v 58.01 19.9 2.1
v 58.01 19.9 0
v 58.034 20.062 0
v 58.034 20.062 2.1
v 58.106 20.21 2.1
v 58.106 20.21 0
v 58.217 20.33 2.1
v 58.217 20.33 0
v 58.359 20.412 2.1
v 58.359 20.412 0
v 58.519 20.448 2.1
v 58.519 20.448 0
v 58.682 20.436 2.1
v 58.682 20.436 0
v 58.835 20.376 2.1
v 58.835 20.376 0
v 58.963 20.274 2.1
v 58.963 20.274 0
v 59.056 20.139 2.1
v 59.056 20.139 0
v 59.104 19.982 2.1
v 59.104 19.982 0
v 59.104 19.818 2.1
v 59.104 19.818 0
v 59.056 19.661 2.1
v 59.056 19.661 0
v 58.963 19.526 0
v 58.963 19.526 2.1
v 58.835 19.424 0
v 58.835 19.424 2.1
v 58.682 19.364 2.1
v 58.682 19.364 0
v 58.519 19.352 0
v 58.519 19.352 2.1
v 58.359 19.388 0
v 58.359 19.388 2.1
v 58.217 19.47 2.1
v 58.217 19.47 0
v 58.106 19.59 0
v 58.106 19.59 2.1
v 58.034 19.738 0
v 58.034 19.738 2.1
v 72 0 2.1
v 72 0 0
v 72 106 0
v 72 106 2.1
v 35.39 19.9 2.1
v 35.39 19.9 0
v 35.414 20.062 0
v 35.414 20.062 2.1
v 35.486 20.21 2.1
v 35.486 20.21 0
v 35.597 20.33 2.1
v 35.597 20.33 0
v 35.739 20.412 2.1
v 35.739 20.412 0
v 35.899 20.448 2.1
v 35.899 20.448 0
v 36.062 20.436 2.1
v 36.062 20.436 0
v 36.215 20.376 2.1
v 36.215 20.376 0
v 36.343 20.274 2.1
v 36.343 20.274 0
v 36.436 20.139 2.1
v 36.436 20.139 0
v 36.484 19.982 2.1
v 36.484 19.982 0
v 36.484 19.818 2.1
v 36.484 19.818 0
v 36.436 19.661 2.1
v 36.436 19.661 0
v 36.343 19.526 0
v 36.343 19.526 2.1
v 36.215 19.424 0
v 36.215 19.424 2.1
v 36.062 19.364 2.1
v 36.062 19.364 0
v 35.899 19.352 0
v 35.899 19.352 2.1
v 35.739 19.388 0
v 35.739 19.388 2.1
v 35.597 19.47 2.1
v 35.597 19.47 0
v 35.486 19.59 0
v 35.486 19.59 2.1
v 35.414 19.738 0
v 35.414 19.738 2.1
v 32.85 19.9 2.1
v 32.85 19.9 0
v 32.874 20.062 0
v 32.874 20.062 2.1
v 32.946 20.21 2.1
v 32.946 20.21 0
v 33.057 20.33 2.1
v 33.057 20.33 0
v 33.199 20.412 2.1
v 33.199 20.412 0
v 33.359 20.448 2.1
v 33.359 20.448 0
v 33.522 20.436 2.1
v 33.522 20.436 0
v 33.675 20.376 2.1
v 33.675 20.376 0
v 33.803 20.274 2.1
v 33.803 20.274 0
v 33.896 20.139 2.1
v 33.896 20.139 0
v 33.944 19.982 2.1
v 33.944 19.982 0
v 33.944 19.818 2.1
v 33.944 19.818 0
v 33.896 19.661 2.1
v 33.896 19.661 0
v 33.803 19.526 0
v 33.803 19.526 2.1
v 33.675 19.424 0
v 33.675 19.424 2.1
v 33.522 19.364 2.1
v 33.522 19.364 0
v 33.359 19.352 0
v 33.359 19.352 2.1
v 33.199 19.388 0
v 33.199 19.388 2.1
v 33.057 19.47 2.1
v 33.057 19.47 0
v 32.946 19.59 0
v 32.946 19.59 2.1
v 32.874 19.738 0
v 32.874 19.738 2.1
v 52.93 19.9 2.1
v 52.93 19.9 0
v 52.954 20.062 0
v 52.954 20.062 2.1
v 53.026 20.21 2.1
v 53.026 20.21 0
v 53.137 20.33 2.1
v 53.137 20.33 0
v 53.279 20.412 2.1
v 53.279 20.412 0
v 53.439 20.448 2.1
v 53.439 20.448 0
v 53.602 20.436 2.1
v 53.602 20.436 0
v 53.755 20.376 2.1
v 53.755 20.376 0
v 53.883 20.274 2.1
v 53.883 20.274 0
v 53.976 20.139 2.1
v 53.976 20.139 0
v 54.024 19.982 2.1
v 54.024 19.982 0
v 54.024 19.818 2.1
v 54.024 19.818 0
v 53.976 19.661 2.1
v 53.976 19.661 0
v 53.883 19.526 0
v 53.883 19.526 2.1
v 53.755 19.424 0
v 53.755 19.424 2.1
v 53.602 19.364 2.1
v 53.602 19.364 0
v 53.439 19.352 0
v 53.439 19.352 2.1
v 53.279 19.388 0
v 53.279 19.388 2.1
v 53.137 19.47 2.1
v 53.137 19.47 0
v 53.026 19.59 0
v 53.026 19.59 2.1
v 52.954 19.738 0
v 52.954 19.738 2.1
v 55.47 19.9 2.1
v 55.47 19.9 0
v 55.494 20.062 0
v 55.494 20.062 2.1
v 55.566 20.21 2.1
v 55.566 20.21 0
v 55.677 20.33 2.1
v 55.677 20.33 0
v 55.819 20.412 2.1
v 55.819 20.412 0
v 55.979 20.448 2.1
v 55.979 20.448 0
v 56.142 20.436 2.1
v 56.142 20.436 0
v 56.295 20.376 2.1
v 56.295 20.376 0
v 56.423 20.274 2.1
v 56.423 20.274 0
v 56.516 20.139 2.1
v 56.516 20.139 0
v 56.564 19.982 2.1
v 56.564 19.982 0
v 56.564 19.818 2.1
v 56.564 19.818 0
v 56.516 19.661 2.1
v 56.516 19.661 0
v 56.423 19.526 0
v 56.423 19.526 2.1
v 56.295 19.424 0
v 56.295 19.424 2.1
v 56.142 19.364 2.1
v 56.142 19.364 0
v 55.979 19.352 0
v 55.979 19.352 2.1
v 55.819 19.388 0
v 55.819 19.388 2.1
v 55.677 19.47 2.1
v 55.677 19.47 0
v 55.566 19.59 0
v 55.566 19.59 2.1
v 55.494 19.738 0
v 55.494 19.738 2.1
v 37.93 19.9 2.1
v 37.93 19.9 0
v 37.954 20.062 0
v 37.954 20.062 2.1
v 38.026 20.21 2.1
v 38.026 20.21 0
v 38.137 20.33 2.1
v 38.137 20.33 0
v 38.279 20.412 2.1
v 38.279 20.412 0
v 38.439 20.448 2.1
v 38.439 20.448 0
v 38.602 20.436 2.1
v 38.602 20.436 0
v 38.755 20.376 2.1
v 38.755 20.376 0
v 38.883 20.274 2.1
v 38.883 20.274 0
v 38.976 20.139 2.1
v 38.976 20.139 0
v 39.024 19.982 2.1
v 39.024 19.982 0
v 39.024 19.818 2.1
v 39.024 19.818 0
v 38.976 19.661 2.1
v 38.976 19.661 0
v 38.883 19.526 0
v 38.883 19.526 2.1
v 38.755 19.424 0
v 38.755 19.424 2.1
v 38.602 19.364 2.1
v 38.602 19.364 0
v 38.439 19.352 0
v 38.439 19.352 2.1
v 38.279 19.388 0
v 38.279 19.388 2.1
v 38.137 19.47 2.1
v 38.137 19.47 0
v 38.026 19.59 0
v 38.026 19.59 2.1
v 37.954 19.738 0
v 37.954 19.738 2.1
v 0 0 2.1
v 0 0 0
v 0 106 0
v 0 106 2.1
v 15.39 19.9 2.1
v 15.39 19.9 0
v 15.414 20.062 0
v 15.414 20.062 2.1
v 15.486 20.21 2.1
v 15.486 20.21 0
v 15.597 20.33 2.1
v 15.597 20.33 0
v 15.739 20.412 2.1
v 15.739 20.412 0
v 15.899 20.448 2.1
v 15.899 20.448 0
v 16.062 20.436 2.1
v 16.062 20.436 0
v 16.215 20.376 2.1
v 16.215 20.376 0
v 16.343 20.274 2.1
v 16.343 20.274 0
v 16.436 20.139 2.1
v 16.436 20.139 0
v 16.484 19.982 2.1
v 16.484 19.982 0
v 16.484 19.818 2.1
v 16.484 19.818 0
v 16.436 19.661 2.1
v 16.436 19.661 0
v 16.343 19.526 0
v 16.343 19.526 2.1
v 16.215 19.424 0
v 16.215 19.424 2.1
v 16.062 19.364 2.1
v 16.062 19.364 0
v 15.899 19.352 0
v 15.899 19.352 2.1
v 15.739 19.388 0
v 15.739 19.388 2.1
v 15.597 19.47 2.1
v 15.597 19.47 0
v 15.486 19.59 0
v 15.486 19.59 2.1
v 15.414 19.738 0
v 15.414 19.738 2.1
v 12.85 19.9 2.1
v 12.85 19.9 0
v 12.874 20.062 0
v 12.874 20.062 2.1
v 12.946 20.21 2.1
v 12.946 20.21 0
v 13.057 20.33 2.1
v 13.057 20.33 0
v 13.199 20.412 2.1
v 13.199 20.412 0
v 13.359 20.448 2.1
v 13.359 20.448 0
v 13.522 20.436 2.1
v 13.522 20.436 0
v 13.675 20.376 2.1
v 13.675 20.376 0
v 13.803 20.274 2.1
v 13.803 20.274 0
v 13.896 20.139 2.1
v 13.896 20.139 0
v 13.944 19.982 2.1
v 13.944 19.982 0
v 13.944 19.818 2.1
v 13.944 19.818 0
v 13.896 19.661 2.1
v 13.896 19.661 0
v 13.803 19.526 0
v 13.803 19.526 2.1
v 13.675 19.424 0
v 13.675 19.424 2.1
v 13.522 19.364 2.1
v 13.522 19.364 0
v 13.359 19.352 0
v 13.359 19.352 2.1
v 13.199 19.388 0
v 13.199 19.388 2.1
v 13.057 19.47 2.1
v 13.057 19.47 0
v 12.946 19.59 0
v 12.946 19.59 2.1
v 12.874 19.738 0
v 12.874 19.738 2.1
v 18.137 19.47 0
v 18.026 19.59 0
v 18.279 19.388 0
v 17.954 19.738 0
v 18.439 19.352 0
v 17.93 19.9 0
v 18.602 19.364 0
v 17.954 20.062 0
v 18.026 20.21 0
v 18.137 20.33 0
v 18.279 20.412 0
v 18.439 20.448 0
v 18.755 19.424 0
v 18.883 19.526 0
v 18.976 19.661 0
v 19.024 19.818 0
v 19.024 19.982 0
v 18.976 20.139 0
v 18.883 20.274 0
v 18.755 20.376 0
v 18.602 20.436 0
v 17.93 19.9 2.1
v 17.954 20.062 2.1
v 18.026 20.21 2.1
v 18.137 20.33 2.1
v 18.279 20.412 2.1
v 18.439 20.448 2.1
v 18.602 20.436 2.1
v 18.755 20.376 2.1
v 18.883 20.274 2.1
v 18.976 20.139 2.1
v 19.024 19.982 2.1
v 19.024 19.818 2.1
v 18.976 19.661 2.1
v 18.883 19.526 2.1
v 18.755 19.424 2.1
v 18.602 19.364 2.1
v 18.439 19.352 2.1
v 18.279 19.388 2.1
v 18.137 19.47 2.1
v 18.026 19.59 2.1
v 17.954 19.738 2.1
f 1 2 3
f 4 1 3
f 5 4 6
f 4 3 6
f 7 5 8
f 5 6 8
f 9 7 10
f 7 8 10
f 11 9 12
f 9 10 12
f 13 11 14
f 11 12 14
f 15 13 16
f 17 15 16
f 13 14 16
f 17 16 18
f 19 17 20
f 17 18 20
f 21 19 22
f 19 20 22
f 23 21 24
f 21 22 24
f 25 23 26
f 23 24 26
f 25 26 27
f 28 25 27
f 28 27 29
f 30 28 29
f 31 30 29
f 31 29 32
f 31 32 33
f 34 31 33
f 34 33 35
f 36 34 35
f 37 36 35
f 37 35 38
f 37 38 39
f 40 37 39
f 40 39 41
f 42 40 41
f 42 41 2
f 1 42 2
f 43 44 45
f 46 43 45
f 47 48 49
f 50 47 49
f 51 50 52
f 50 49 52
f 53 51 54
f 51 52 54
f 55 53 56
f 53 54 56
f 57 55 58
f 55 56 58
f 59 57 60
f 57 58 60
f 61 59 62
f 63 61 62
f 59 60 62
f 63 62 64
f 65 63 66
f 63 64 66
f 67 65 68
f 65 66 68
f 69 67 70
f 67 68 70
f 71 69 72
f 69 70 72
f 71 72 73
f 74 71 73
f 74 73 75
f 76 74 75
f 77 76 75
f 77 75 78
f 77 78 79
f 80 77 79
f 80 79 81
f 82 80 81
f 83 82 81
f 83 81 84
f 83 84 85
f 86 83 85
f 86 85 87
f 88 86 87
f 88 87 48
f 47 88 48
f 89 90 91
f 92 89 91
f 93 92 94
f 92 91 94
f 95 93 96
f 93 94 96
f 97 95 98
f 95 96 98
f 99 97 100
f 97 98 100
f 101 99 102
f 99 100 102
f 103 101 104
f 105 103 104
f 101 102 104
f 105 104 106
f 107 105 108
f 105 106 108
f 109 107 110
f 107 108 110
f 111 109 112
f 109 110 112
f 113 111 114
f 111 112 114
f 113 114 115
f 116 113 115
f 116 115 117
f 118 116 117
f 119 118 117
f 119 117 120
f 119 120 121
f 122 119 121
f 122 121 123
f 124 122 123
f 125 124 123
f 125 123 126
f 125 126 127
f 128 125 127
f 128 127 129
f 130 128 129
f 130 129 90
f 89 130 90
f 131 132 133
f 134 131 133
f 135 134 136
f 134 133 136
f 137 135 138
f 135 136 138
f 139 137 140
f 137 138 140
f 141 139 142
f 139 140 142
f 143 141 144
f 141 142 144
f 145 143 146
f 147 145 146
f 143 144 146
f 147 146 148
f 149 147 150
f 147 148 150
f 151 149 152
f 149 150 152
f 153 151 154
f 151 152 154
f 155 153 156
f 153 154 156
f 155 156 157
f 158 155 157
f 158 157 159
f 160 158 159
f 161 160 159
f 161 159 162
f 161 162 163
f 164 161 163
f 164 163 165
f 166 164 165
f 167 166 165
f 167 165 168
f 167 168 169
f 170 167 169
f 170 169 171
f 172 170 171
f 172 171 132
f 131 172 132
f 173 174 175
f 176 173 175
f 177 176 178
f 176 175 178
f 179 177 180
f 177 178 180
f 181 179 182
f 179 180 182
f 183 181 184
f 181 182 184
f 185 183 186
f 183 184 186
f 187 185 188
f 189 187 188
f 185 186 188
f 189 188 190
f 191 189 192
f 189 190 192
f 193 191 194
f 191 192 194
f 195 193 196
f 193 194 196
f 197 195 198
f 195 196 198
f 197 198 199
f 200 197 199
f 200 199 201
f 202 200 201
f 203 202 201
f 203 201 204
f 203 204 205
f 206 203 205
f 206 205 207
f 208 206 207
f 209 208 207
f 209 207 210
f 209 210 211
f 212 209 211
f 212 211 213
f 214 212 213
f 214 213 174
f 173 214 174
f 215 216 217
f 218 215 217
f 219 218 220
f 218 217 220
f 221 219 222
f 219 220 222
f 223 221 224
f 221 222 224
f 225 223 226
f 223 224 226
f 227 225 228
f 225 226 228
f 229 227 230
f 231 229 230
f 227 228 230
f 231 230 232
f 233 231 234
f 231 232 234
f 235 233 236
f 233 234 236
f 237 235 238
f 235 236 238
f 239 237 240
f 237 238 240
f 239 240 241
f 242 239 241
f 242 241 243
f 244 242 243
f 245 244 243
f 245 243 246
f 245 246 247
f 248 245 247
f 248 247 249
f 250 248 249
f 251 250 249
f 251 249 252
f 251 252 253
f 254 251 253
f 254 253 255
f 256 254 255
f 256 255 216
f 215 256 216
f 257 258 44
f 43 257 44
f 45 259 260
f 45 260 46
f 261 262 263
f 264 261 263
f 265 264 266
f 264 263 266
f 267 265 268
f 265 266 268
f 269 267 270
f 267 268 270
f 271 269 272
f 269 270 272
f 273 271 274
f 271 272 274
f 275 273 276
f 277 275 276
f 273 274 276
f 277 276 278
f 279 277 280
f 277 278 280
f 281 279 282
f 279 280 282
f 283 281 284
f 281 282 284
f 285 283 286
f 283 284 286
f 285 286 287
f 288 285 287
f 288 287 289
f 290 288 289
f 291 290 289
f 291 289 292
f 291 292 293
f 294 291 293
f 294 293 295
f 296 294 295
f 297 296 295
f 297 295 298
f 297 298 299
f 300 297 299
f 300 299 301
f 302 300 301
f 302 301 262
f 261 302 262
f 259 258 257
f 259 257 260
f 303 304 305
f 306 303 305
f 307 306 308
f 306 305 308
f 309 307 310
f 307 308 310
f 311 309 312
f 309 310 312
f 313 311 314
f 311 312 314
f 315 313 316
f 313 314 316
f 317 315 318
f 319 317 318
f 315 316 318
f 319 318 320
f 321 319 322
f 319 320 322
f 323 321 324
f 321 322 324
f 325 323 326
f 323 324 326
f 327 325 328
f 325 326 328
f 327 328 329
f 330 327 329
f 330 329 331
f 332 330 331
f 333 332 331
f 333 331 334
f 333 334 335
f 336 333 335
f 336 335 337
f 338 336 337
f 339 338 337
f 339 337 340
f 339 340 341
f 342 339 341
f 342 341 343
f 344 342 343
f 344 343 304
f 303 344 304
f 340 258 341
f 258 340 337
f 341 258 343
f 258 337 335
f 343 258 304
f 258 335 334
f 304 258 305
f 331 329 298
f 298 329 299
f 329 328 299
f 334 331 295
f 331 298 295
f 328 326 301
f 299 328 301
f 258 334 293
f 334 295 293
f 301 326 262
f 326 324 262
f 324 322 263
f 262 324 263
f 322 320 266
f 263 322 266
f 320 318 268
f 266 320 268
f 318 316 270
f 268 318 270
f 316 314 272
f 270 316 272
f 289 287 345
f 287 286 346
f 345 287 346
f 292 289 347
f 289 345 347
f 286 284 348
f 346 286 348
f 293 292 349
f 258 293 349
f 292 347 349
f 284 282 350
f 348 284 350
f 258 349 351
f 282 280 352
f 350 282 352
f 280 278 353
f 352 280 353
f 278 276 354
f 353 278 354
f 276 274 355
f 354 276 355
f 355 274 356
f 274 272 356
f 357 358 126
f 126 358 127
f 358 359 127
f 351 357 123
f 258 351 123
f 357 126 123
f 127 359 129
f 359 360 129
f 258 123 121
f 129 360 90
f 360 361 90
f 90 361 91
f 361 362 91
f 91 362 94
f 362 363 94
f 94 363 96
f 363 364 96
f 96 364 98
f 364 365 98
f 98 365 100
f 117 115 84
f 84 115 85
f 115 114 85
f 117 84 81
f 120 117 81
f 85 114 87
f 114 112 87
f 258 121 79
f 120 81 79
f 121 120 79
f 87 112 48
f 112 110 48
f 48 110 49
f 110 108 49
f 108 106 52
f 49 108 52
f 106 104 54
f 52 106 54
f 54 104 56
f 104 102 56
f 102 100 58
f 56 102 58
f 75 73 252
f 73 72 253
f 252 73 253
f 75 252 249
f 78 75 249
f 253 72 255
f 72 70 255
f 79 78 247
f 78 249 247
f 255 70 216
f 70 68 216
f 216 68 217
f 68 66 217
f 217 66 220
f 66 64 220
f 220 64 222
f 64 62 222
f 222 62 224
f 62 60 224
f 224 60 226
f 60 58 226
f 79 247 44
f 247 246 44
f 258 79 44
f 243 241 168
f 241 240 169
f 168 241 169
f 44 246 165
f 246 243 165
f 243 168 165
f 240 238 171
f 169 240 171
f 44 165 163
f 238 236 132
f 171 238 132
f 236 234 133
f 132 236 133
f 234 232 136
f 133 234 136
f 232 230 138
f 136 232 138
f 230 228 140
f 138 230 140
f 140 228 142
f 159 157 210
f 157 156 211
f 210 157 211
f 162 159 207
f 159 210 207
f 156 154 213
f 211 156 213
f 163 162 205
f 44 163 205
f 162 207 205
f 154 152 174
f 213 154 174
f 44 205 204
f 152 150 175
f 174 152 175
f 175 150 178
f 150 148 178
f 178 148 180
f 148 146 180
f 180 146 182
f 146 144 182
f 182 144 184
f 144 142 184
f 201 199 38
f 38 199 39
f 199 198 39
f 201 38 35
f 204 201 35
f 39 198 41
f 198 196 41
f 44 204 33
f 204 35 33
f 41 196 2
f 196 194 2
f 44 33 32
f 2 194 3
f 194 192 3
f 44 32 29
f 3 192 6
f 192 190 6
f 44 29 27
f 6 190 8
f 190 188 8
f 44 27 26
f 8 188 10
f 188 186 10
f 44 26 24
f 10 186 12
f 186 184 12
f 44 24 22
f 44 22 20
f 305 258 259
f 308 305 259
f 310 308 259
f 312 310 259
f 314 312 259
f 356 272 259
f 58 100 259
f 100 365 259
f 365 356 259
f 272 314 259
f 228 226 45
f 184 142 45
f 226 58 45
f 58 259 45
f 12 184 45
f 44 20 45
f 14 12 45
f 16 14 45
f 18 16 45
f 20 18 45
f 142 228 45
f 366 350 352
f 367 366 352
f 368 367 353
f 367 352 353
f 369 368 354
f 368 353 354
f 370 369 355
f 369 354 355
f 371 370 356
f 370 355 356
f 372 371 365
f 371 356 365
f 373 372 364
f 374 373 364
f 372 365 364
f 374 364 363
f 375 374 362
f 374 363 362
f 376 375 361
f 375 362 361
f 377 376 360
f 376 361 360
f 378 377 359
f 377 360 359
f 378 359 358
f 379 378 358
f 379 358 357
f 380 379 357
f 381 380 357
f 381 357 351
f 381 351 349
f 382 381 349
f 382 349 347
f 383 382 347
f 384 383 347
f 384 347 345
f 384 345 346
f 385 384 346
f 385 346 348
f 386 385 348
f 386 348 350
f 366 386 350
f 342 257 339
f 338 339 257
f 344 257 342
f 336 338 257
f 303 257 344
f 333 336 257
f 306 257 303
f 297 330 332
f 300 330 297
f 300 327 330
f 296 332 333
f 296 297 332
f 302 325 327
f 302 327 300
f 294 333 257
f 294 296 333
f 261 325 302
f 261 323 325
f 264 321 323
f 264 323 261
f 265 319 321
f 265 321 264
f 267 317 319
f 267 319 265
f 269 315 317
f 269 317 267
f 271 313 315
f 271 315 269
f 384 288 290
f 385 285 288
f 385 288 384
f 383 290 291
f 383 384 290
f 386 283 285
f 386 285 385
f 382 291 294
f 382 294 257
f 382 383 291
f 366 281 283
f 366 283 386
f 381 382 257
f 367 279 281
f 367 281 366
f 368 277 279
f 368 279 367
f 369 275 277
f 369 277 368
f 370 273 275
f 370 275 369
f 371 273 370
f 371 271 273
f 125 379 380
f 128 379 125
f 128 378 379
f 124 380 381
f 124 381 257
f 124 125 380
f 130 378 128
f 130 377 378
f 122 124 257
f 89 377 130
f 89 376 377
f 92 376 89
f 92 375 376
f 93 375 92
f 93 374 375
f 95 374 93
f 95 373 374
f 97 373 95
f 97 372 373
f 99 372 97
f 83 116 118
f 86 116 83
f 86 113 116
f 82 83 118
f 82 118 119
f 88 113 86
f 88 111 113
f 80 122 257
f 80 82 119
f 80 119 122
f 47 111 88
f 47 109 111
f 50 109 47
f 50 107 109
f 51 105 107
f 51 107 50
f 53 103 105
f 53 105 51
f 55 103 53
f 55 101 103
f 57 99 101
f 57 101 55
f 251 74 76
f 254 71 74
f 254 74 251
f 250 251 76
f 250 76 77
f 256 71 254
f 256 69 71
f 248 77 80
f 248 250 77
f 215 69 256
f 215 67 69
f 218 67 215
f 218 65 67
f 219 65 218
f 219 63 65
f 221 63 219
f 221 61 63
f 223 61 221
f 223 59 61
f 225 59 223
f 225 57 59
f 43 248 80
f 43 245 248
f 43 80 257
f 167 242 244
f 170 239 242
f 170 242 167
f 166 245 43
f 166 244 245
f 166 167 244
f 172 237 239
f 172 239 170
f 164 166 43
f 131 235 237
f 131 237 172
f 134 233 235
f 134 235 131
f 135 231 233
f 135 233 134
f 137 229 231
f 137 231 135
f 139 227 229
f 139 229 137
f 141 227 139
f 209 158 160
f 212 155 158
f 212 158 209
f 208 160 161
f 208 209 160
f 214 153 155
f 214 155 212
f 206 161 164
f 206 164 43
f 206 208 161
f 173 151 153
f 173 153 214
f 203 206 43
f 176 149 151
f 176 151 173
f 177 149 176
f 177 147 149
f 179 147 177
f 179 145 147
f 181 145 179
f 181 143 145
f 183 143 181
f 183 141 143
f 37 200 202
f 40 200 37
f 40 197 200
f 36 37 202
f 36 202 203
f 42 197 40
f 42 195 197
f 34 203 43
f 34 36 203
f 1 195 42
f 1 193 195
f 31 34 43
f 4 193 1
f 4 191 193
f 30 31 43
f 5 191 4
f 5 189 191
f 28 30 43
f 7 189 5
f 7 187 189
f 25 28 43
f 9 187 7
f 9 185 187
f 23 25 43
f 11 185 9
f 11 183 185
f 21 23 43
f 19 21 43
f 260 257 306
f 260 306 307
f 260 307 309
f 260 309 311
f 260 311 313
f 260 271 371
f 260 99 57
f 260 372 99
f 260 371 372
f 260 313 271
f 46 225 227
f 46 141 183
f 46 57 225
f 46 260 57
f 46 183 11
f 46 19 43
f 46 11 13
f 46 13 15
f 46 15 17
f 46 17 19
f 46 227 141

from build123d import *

# Parameters (mm, degrees)
F0_W     = 72
F0_H     = 106
F1_DEPTH = 2.1
F3_D     = 1.1


with BuildPart() as f1:
    # F0 (on Top) → F1 (new body)
    with BuildSketch(Plane.XY):
        with Locations((36, 53)):
            Rectangle(F0_W, F0_H)
    extrude(amount=F1_DEPTH)

    # F3 (through all)
    with Locations(Plane.XY.offset(2.1)):
        with Locations((13.4, 19.9), (15.94, 19.9), (18.48, 19.9), (33.4, 19.9), (35.94, 19.9), (38.48, 19.9), (53.48, 19.9), (56.02, 19.9), (58.56, 19.9)):
            Hole(F3_D / 2)


solid = f1.part
